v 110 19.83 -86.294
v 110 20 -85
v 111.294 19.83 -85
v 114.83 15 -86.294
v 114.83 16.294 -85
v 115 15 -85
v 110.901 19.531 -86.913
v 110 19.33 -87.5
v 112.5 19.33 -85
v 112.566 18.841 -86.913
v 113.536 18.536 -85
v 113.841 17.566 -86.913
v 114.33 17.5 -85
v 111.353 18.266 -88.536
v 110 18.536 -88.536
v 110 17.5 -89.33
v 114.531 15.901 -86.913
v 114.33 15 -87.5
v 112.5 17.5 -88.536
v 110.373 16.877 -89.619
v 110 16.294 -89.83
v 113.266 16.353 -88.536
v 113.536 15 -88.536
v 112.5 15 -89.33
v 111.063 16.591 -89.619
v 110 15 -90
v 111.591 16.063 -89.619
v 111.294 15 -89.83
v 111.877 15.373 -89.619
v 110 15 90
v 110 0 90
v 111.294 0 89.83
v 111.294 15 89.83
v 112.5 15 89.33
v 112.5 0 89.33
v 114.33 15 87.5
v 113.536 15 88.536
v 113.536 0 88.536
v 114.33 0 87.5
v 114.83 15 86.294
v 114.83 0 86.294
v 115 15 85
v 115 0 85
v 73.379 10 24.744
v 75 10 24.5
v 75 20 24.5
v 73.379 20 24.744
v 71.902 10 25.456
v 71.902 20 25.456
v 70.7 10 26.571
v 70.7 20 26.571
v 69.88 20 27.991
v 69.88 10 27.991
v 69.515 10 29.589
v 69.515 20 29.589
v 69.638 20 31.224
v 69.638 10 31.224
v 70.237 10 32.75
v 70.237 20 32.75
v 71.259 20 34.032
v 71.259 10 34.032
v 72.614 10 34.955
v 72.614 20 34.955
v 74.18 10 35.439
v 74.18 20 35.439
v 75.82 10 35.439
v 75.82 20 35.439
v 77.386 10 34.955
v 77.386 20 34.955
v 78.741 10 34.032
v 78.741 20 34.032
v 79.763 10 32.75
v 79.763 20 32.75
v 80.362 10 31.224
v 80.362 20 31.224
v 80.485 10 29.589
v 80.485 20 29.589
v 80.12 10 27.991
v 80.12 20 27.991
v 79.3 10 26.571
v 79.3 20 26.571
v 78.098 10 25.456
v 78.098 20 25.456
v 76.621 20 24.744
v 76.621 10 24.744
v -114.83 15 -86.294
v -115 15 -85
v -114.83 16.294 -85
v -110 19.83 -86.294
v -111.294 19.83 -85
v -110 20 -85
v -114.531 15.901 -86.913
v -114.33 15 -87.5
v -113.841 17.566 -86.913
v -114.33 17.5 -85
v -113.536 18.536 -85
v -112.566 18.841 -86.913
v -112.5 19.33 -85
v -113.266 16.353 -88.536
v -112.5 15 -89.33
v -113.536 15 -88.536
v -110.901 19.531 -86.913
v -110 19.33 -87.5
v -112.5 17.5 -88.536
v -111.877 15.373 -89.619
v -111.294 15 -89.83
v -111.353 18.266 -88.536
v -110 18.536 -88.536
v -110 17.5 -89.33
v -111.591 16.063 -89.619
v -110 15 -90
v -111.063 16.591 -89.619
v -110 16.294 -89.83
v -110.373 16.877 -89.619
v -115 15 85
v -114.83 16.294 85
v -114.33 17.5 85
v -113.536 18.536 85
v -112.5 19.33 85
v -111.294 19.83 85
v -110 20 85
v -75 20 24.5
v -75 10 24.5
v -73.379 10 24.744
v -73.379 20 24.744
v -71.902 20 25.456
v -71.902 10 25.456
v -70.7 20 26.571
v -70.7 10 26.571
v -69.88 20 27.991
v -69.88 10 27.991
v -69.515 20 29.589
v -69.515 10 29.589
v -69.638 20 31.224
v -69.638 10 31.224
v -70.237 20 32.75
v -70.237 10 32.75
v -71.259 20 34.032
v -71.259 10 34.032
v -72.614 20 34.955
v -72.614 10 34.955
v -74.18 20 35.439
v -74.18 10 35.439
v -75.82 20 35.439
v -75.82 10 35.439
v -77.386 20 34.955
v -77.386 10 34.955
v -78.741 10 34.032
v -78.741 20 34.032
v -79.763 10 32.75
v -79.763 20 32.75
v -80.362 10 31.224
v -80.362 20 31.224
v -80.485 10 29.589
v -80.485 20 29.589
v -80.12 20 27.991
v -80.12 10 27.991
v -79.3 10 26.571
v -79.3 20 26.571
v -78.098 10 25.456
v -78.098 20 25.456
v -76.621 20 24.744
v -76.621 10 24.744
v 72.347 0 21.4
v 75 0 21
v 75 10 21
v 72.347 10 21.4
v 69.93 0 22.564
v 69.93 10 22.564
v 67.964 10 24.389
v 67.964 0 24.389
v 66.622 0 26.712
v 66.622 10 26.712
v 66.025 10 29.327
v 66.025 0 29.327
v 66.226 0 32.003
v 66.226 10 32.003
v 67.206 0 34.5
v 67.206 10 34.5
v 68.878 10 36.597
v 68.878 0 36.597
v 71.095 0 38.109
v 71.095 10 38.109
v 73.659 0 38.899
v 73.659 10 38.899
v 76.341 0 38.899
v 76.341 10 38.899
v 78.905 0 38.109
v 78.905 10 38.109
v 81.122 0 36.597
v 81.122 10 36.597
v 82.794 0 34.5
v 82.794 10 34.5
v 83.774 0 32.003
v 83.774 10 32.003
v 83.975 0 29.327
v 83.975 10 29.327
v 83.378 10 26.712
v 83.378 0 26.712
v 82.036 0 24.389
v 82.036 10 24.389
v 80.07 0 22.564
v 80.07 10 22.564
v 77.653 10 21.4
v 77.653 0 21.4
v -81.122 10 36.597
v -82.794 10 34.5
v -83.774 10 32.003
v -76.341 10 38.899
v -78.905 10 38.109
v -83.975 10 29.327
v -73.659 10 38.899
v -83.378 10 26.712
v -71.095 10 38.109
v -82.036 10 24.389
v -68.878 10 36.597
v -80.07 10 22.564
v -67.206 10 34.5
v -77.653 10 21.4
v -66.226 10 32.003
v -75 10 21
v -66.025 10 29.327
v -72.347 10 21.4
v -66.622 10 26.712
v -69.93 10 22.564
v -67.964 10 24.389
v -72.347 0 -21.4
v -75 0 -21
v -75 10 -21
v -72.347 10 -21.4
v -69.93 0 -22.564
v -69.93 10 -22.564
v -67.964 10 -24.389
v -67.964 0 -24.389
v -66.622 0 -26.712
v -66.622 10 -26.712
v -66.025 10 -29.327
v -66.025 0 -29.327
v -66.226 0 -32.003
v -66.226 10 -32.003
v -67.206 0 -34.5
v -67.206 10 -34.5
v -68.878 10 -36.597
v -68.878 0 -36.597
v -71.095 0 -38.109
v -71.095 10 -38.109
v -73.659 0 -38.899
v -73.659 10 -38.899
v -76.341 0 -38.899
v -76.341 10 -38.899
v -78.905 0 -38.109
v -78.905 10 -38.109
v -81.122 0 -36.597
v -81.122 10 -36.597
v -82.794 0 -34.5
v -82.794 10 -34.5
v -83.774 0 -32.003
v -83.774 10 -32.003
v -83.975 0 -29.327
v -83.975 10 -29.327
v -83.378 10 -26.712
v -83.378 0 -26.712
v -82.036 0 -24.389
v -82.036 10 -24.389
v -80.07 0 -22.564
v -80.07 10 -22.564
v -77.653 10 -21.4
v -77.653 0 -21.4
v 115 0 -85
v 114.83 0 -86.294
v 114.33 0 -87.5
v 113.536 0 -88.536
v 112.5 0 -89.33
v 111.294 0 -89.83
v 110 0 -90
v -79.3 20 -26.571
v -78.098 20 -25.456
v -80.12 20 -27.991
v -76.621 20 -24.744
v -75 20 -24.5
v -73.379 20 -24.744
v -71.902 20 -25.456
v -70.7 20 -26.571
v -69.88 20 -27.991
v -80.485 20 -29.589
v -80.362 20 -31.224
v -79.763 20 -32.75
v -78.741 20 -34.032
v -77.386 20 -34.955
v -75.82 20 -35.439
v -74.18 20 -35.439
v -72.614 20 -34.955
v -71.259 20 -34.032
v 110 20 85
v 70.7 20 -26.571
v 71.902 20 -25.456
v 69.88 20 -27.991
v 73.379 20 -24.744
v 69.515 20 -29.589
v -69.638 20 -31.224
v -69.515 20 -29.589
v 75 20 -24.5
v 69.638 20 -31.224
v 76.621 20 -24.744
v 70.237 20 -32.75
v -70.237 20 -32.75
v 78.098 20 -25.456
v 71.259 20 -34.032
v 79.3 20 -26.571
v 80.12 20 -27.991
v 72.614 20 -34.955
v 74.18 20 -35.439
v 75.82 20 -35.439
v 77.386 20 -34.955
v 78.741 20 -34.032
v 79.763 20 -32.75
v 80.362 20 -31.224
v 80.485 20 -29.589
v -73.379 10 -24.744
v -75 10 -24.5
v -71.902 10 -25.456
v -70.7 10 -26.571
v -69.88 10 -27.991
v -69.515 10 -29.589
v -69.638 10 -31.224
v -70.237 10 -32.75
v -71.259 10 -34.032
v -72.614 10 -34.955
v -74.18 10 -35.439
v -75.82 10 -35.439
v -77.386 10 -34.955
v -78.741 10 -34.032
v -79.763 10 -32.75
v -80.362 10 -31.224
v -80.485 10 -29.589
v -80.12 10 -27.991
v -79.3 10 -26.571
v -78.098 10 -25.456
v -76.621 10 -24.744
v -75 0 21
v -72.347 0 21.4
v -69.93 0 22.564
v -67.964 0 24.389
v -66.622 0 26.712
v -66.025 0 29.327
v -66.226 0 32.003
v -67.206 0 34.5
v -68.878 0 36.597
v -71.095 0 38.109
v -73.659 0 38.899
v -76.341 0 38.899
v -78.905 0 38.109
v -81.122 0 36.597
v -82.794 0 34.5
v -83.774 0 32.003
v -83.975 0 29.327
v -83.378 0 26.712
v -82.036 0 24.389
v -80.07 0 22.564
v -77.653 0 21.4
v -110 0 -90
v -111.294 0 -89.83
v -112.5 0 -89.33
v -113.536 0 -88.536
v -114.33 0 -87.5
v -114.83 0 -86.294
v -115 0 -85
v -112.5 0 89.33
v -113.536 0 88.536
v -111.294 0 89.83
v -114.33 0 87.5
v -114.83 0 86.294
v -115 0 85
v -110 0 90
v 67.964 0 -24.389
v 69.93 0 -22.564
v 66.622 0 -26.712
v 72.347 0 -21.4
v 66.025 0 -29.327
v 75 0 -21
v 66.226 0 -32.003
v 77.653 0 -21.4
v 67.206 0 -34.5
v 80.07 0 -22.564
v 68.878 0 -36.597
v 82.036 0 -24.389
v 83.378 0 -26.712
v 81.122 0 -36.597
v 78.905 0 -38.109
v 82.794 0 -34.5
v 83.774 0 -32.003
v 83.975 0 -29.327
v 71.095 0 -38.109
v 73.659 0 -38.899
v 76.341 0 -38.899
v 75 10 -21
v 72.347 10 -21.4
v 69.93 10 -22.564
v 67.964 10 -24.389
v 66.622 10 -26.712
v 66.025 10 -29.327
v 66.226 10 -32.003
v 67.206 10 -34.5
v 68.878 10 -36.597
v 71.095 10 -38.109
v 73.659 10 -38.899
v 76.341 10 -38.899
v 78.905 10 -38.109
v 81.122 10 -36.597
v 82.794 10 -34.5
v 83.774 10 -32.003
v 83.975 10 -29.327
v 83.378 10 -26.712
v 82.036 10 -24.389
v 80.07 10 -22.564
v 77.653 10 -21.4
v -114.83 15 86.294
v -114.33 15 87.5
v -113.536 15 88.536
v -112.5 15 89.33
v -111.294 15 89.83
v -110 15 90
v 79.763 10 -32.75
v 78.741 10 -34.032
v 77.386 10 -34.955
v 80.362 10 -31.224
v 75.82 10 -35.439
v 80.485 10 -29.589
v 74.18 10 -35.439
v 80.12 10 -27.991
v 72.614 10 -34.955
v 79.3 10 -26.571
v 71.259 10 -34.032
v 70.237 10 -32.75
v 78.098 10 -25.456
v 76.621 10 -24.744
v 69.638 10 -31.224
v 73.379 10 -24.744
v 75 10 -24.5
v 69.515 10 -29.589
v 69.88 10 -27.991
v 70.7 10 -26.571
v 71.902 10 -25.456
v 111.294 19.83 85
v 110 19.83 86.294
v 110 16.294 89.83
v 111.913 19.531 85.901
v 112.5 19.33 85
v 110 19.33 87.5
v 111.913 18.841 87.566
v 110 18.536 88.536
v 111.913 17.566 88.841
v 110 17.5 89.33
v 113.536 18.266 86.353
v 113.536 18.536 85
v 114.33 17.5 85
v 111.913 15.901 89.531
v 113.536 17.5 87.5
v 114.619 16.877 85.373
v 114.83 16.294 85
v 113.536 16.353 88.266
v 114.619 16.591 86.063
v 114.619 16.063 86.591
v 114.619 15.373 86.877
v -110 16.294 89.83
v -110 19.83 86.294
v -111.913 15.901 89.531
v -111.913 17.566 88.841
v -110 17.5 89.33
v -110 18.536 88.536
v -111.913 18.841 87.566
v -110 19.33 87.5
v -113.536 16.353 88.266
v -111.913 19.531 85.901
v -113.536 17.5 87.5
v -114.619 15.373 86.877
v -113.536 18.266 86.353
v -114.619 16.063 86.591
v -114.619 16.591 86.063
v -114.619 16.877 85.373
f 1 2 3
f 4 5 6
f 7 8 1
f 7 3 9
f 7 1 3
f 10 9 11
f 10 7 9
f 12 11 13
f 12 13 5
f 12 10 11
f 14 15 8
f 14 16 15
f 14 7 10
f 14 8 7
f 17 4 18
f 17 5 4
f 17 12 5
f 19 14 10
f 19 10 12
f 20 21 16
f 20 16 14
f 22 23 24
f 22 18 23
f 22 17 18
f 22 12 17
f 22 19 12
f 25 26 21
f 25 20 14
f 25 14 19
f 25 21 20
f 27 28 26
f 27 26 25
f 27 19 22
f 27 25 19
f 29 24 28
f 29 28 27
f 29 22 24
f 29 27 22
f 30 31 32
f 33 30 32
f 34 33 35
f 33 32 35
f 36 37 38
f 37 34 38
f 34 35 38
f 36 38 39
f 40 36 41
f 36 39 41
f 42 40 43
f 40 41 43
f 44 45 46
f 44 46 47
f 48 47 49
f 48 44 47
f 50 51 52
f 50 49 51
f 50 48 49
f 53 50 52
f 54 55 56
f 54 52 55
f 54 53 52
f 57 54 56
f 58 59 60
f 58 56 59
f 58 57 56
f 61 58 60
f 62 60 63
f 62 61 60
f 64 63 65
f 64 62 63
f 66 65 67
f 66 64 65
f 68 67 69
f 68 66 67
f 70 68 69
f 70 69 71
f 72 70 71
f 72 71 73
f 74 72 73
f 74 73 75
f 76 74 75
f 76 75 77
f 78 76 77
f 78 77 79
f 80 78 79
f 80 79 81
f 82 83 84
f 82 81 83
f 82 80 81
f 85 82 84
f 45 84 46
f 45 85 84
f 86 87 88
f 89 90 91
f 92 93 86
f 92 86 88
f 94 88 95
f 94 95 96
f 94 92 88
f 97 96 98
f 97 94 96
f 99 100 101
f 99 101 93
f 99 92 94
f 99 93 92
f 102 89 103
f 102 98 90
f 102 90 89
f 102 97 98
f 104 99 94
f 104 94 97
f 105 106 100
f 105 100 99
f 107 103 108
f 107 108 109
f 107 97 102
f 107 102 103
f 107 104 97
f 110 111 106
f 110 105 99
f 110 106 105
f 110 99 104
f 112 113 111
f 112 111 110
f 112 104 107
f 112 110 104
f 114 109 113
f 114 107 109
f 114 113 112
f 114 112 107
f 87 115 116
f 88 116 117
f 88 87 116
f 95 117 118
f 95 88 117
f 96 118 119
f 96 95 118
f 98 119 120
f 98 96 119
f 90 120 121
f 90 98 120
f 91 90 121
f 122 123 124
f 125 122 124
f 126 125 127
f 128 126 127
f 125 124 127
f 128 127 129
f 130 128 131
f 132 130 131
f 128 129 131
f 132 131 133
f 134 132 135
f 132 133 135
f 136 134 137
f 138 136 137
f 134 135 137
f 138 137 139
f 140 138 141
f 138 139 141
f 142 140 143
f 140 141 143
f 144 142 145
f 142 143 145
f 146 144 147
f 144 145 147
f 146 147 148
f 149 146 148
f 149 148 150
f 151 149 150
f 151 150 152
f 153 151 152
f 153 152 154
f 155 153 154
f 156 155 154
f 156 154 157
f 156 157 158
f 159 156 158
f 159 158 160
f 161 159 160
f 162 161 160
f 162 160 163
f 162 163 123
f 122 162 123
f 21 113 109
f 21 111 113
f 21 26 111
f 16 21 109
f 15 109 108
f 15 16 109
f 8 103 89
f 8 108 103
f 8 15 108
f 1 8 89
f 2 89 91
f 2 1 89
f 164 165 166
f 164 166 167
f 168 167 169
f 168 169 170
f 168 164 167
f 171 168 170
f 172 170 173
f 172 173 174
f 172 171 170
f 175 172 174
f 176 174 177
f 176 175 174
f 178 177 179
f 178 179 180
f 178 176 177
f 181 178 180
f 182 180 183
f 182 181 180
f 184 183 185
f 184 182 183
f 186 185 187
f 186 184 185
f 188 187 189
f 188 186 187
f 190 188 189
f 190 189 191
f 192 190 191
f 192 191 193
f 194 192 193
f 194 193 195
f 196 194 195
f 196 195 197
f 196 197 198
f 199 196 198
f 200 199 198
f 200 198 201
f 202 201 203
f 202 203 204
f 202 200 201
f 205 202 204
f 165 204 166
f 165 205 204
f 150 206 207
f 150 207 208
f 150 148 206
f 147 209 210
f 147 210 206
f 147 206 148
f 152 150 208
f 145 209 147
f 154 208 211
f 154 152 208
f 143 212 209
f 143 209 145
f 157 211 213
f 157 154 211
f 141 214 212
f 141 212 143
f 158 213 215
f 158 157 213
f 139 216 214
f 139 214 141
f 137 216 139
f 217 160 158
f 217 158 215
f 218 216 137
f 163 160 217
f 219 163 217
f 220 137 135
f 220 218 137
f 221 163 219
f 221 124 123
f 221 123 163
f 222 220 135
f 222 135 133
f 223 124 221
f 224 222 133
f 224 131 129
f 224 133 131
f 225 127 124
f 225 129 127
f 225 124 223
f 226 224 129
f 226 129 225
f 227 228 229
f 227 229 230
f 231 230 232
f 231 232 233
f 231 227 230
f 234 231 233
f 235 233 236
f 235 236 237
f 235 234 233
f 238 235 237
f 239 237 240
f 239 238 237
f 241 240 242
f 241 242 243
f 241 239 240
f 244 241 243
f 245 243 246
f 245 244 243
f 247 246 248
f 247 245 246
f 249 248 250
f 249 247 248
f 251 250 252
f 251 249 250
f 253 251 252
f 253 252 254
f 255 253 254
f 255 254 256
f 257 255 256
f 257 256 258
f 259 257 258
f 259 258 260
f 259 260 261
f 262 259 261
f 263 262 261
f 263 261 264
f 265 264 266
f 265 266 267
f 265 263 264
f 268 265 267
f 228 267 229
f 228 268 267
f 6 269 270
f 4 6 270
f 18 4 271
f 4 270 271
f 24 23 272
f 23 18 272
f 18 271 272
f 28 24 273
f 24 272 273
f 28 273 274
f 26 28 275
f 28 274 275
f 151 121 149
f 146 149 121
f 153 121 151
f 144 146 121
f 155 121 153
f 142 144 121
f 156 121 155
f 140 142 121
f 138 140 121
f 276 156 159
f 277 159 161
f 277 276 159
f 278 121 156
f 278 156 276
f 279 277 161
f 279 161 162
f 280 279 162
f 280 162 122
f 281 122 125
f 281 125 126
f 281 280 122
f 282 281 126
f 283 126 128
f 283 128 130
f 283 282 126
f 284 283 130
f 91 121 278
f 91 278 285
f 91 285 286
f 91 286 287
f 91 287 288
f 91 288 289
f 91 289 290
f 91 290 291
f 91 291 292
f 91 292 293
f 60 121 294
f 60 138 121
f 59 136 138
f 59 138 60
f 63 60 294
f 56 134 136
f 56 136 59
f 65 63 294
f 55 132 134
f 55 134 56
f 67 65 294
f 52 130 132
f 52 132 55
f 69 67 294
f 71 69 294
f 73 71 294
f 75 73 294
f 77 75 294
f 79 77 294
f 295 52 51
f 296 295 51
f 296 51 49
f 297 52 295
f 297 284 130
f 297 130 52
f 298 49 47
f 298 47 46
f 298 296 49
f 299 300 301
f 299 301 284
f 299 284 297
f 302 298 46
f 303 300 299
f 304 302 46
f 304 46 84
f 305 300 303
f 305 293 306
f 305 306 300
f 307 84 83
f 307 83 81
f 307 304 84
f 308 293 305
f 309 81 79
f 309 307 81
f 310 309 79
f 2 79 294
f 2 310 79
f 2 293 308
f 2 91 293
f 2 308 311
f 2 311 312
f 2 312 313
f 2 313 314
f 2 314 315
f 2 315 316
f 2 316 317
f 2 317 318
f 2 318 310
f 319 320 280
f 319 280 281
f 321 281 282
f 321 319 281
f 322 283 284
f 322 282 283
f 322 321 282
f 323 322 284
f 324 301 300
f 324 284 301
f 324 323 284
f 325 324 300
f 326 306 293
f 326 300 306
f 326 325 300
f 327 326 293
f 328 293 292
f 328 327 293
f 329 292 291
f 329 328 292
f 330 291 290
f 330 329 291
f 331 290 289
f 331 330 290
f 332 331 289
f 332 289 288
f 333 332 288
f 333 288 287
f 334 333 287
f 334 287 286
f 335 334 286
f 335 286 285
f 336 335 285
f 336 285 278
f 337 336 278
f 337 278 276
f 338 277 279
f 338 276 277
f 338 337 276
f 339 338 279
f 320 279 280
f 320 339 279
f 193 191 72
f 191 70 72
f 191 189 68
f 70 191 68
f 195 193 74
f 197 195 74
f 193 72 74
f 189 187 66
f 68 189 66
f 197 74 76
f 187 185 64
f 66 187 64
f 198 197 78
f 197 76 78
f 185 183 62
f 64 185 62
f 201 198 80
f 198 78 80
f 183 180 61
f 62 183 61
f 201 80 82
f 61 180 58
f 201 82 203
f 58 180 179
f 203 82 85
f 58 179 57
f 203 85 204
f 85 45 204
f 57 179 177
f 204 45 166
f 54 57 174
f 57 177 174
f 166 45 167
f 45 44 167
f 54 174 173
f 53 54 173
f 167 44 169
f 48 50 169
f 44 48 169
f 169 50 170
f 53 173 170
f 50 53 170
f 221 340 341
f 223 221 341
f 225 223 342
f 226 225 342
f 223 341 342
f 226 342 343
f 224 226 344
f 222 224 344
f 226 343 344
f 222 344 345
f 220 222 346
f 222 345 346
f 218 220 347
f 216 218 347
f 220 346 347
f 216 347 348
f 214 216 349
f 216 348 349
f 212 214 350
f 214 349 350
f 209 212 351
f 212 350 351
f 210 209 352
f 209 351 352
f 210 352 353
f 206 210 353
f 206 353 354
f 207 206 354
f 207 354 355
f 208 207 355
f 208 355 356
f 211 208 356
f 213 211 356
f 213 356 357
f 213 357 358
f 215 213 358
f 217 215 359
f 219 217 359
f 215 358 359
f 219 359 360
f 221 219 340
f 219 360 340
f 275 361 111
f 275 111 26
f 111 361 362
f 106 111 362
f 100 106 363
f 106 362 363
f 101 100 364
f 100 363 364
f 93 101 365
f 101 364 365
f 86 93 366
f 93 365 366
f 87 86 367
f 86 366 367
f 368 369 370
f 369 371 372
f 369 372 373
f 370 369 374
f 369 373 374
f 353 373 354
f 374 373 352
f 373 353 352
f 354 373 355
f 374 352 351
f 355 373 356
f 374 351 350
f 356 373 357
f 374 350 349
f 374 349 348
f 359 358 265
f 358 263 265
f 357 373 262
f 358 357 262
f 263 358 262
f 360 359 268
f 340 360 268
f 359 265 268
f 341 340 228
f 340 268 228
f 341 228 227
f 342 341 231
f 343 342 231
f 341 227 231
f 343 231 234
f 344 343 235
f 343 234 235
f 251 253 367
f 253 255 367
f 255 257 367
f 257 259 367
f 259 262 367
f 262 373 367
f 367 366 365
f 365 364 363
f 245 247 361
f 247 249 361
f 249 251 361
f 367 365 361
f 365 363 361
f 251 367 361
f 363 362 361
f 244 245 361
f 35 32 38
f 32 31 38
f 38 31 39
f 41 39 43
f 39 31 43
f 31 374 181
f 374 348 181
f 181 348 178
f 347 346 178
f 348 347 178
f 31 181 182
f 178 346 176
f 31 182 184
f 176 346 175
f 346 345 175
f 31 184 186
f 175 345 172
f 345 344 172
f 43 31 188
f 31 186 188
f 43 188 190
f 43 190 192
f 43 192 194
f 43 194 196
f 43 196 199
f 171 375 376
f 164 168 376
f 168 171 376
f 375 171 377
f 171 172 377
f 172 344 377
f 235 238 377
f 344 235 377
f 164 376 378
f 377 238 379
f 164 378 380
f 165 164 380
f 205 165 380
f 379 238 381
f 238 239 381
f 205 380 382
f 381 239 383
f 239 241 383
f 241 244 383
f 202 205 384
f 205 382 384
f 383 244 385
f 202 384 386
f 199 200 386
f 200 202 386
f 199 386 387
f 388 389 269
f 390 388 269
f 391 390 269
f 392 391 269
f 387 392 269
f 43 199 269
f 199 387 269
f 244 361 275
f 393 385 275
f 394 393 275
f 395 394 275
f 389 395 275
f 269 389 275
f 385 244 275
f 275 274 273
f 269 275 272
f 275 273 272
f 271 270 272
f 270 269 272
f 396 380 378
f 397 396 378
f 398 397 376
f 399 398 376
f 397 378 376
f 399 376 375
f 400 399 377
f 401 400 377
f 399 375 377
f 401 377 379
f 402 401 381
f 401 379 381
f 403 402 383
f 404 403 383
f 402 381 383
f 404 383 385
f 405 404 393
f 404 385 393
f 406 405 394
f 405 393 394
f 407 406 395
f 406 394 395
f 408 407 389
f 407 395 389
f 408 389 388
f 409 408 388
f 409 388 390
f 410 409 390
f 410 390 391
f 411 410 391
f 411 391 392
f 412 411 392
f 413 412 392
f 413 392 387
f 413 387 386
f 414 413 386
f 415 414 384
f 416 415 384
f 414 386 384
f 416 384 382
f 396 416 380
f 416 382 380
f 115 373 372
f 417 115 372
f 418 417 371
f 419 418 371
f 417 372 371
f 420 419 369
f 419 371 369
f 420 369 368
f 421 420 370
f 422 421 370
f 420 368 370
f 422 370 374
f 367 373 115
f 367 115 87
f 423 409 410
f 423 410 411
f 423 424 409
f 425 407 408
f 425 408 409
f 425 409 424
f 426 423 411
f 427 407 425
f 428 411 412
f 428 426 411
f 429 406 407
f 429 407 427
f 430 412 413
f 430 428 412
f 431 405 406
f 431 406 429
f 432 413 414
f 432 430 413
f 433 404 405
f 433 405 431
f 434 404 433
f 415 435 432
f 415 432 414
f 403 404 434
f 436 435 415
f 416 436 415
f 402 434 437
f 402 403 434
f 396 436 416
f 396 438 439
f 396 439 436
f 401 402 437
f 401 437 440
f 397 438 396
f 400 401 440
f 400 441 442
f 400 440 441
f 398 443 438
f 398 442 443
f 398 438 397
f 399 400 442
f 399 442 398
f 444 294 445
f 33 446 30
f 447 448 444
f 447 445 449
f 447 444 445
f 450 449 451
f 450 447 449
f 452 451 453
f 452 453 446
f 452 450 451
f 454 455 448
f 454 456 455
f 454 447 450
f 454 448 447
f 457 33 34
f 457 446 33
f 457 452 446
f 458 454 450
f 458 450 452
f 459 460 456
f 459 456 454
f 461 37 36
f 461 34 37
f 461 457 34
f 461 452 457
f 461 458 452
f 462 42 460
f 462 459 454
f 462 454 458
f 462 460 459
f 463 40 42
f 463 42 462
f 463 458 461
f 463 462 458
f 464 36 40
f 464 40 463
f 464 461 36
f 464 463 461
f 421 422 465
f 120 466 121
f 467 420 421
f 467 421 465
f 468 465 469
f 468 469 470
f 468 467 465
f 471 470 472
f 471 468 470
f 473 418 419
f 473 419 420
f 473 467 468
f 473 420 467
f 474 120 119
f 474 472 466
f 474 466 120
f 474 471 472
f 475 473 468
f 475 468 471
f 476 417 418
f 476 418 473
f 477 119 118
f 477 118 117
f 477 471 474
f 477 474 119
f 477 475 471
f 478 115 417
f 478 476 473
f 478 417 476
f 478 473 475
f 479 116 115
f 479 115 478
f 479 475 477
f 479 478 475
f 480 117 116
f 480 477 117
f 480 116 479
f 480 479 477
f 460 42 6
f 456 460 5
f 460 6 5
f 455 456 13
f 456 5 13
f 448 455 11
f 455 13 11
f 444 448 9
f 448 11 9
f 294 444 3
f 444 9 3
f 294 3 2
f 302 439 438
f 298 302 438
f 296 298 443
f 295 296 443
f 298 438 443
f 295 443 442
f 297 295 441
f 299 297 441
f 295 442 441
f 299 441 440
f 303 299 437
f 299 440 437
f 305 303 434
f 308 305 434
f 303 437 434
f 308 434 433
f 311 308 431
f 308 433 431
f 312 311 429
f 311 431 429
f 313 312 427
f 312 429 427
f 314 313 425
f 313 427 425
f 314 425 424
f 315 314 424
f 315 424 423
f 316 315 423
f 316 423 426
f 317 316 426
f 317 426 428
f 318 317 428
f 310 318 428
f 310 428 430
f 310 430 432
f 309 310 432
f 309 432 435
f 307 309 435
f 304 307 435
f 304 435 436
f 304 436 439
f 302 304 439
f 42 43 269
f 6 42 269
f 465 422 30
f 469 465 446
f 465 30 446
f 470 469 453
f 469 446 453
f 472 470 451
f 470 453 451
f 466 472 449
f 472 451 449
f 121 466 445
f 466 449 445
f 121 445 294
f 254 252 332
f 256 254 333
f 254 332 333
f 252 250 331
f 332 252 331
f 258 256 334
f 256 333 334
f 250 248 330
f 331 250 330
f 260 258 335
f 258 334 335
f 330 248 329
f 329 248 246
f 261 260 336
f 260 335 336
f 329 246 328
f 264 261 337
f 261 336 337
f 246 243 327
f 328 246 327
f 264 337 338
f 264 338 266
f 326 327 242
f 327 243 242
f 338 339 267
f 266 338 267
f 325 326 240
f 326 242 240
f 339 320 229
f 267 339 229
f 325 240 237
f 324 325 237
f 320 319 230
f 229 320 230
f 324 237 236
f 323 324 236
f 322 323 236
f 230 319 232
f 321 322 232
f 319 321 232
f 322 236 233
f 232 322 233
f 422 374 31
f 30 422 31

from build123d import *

# Parameters (mm, degrees)
SKETCH1_W               = 230
SKETCH1_H               = 180
BOSS_EXTRUDE1_DEPTH     = 20
FILLET1_R               = 5
SKETCH2_R               = 9
CUT_EXTRUDE1_DEPTH      = 10
SKETCH2_3_R             = 5.5
CUT_EXTRUDE2_DEPTH      = 148.39402973
MIRROR2_COPY_1_SKETCH_R = 9
MIRROR2_COPY_1_DEPTH    = 10
MIRROR2_COPY_2_SKETCH_R = 5.5
MIRROR2_COPY_2_DEPTH    = 148.39402973
FILLET2_R               = 5


with BuildPart() as part:
    # Sketch1 → Boss-Extrude1 (new body)
    with BuildSketch(Plane(origin=(0, 0, 0), x_dir=(1, 0, 0), z_dir=(0, 1, 0))):
        Rectangle(SKETCH1_W, SKETCH1_H)
    extrude(amount=BOSS_EXTRUDE1_DEPTH)

    # Fillet1
    fillet1_edges = [part.edges().sort_by_distance(p)[0] for p in [
        (-115, 20, 0),
        (0, 20, 90),
        (115, 20, 0),
        (0, 20, -90),
    ]]
    fillet(fillet1_edges, radius=FILLET1_R)

    # Sketch2 → Cut-Extrude1 (cut)
    with BuildSketch(Plane.XZ):
        with Locations(Location((-75, 30, 0), (0, 0, 270))):
            Circle(SKETCH2_R)
    cut_extrude1 = extrude(amount=-CUT_EXTRUDE1_DEPTH, mode=Mode.SUBTRACT)

    # Sketch2<3> → Cut-Extrude2 (cut, through all)
    with BuildSketch(Plane.XZ):
        with Locations(Location((-75, 30, 0), (0, 0, 270))):
            Circle(SKETCH2_3_R)
    cut_extrude2 = extrude(amount=-CUT_EXTRUDE2_DEPTH, mode=Mode.SUBTRACT)

    # Mirror1: Cut-Extrude1, Cut-Extrude2 across plane
    add(cut_extrude1.mirror(Plane(origin=(0, 0, 0), x_dir=(0, 0, 1), z_dir=(1, 0, 0))), mode=Mode.SUBTRACT)
    add(cut_extrude2.mirror(Plane(origin=(0, 0, 0), x_dir=(0, 0, 1), z_dir=(1, 0, 0))), mode=Mode.SUBTRACT)

    # Mirror2: Cut-Extrude1, Cut-Extrude2 across plane
    add(cut_extrude1.mirror(Plane.XY), mode=Mode.SUBTRACT)
    add(cut_extrude2.mirror(Plane.XY), mode=Mode.SUBTRACT)

    # Mirror2 copy 1 sketch → Mirror2 copy 1 (cut)
    with BuildSketch(Plane(origin=(0, 0, 0), x_dir=(-1, 0, 0), z_dir=(0, -1, 0))):
        with Locations(Location((-75, 30, 0), (0, 0, 270))):
            Circle(MIRROR2_COPY_1_SKETCH_R)
    extrude(amount=-MIRROR2_COPY_1_DEPTH, mode=Mode.SUBTRACT)

    # Mirror2 copy 2 sketch → Mirror2 copy 2 (cut, through all)
    with BuildSketch(Plane(origin=(0, 0, 0), x_dir=(-1, 0, 0), z_dir=(0, -1, 0))):
        with Locations(Location((-75, 30, 0), (0, 0, 270))):
            Circle(MIRROR2_COPY_2_SKETCH_R)
    extrude(amount=-MIRROR2_COPY_2_DEPTH, mode=Mode.SUBTRACT)

    # Fillet2
    # the kernel refuses this fillet: 5 mm, written as the material it takes off along each edge
    with BuildSketch(Plane(origin=(-110, 15, -85), x_dir=(-1, 0, 0), z_dir=(0, 0, -1))) as fillet2_piece_1_section:
        Polygon((0, 0), (FILLET2_R, 0), (FILLET2_R, FILLET2_R), (0, FILLET2_R), align=None)
    fillet2_piece_1 = extrude(amount=FILLET2_R, mode=Mode.PRIVATE)
    fillet2_piece_1 = fillet2_piece_1 - Plane(origin=(-110, 15, -85), x_dir=(0.7071067811865475, -0.7071067811865475, 0), z_dir=(0, 0, -1)) * Sphere(FILLET2_R, mode=Mode.PRIVATE)
    add(fillet2_piece_1, mode=Mode.SUBTRACT)
    with BuildSketch(Plane(origin=(110, 15, -85), x_dir=(1, 0, 0), z_dir=(0, 0, -1))) as fillet2_piece_2_section:
        Polygon((0, 0), (FILLET2_R, 0), (FILLET2_R, -FILLET2_R), (0, -FILLET2_R), align=None)
    fillet2_piece_2 = extrude(amount=FILLET2_R, mode=Mode.PRIVATE)
    fillet2_piece_2 = fillet2_piece_2 - Plane(origin=(110, 15, -85), x_dir=(-0.7071067811865475, -0.7071067811865475, 0), z_dir=(0, 0, -1)) * Sphere(FILLET2_R, mode=Mode.PRIVATE)
    add(fillet2_piece_2, mode=Mode.SUBTRACT)
    with BuildSketch(Plane(origin=(-110, 15, 85), x_dir=(0, 0, 1), z_dir=(-1, 0, 0))) as fillet2_piece_3_section:
        Polygon((0, 0), (FILLET2_R, 0), (FILLET2_R, FILLET2_R), (0, FILLET2_R), align=None)
    fillet2_piece_3 = extrude(amount=FILLET2_R, mode=Mode.PRIVATE)
    fillet2_piece_3 = fillet2_piece_3 - Plane(origin=(-110, 15, 85), x_dir=(0, -0.7071067811865475, -0.7071067811865475), z_dir=(-1, 0, 0)) * Sphere(FILLET2_R, mode=Mode.PRIVATE)
    add(fillet2_piece_3, mode=Mode.SUBTRACT)
    with BuildSketch(Plane(origin=(110, 15, 85), x_dir=(0, 0, 1), z_dir=(1, 0, 0))) as fillet2_piece_4_section:
        Polygon((0, 0), (FILLET2_R, 0), (FILLET2_R, -FILLET2_R), (0, -FILLET2_R), align=None)
    fillet2_piece_4 = extrude(amount=FILLET2_R, mode=Mode.PRIVATE)
    fillet2_piece_4 = fillet2_piece_4 - Plane(origin=(110, 15, 85), x_dir=(0, -0.7071067811865475, -0.7071067811865475), z_dir=(1, 0, 0)) * Sphere(FILLET2_R, mode=Mode.PRIVATE)
    add(fillet2_piece_4, mode=Mode.SUBTRACT)
    with BuildSketch(Plane(origin=(115, -12.5, 90), x_dir=(0, 0, -1), z_dir=(0, 1, 0)), Plane(origin=(115, -12.5, -90), x_dir=(-1, 0, 0), z_dir=(0, 1, 0))) as fillet2_piece_5:
        with BuildLine():
            CenterArc((FILLET2_R, FILLET2_R), FILLET2_R, 180, 90)
            Line((0, FILLET2_R), (0, 0))
            Line((0, 0), (FILLET2_R, 0))
        make_face()
    extrude(amount=27.5, mode=Mode.SUBTRACT)
    with BuildSketch(Plane(origin=(-115, -12.5, 90), x_dir=(0, 0, -1), z_dir=(0, 1, 0)), Plane(origin=(-115, -12.5, -90), x_dir=(1, 0, 0), z_dir=(0, 1, 0))) as fillet2_piece_6:
        with BuildLine():
            CenterArc((FILLET2_R, -FILLET2_R), FILLET2_R, 90, 90)
            Line((0, -FILLET2_R), (0, 0))
            Line((0, 0), (FILLET2_R, 0))
        make_face()
    extrude(amount=27.5, mode=Mode.SUBTRACT)


solid = part.part
